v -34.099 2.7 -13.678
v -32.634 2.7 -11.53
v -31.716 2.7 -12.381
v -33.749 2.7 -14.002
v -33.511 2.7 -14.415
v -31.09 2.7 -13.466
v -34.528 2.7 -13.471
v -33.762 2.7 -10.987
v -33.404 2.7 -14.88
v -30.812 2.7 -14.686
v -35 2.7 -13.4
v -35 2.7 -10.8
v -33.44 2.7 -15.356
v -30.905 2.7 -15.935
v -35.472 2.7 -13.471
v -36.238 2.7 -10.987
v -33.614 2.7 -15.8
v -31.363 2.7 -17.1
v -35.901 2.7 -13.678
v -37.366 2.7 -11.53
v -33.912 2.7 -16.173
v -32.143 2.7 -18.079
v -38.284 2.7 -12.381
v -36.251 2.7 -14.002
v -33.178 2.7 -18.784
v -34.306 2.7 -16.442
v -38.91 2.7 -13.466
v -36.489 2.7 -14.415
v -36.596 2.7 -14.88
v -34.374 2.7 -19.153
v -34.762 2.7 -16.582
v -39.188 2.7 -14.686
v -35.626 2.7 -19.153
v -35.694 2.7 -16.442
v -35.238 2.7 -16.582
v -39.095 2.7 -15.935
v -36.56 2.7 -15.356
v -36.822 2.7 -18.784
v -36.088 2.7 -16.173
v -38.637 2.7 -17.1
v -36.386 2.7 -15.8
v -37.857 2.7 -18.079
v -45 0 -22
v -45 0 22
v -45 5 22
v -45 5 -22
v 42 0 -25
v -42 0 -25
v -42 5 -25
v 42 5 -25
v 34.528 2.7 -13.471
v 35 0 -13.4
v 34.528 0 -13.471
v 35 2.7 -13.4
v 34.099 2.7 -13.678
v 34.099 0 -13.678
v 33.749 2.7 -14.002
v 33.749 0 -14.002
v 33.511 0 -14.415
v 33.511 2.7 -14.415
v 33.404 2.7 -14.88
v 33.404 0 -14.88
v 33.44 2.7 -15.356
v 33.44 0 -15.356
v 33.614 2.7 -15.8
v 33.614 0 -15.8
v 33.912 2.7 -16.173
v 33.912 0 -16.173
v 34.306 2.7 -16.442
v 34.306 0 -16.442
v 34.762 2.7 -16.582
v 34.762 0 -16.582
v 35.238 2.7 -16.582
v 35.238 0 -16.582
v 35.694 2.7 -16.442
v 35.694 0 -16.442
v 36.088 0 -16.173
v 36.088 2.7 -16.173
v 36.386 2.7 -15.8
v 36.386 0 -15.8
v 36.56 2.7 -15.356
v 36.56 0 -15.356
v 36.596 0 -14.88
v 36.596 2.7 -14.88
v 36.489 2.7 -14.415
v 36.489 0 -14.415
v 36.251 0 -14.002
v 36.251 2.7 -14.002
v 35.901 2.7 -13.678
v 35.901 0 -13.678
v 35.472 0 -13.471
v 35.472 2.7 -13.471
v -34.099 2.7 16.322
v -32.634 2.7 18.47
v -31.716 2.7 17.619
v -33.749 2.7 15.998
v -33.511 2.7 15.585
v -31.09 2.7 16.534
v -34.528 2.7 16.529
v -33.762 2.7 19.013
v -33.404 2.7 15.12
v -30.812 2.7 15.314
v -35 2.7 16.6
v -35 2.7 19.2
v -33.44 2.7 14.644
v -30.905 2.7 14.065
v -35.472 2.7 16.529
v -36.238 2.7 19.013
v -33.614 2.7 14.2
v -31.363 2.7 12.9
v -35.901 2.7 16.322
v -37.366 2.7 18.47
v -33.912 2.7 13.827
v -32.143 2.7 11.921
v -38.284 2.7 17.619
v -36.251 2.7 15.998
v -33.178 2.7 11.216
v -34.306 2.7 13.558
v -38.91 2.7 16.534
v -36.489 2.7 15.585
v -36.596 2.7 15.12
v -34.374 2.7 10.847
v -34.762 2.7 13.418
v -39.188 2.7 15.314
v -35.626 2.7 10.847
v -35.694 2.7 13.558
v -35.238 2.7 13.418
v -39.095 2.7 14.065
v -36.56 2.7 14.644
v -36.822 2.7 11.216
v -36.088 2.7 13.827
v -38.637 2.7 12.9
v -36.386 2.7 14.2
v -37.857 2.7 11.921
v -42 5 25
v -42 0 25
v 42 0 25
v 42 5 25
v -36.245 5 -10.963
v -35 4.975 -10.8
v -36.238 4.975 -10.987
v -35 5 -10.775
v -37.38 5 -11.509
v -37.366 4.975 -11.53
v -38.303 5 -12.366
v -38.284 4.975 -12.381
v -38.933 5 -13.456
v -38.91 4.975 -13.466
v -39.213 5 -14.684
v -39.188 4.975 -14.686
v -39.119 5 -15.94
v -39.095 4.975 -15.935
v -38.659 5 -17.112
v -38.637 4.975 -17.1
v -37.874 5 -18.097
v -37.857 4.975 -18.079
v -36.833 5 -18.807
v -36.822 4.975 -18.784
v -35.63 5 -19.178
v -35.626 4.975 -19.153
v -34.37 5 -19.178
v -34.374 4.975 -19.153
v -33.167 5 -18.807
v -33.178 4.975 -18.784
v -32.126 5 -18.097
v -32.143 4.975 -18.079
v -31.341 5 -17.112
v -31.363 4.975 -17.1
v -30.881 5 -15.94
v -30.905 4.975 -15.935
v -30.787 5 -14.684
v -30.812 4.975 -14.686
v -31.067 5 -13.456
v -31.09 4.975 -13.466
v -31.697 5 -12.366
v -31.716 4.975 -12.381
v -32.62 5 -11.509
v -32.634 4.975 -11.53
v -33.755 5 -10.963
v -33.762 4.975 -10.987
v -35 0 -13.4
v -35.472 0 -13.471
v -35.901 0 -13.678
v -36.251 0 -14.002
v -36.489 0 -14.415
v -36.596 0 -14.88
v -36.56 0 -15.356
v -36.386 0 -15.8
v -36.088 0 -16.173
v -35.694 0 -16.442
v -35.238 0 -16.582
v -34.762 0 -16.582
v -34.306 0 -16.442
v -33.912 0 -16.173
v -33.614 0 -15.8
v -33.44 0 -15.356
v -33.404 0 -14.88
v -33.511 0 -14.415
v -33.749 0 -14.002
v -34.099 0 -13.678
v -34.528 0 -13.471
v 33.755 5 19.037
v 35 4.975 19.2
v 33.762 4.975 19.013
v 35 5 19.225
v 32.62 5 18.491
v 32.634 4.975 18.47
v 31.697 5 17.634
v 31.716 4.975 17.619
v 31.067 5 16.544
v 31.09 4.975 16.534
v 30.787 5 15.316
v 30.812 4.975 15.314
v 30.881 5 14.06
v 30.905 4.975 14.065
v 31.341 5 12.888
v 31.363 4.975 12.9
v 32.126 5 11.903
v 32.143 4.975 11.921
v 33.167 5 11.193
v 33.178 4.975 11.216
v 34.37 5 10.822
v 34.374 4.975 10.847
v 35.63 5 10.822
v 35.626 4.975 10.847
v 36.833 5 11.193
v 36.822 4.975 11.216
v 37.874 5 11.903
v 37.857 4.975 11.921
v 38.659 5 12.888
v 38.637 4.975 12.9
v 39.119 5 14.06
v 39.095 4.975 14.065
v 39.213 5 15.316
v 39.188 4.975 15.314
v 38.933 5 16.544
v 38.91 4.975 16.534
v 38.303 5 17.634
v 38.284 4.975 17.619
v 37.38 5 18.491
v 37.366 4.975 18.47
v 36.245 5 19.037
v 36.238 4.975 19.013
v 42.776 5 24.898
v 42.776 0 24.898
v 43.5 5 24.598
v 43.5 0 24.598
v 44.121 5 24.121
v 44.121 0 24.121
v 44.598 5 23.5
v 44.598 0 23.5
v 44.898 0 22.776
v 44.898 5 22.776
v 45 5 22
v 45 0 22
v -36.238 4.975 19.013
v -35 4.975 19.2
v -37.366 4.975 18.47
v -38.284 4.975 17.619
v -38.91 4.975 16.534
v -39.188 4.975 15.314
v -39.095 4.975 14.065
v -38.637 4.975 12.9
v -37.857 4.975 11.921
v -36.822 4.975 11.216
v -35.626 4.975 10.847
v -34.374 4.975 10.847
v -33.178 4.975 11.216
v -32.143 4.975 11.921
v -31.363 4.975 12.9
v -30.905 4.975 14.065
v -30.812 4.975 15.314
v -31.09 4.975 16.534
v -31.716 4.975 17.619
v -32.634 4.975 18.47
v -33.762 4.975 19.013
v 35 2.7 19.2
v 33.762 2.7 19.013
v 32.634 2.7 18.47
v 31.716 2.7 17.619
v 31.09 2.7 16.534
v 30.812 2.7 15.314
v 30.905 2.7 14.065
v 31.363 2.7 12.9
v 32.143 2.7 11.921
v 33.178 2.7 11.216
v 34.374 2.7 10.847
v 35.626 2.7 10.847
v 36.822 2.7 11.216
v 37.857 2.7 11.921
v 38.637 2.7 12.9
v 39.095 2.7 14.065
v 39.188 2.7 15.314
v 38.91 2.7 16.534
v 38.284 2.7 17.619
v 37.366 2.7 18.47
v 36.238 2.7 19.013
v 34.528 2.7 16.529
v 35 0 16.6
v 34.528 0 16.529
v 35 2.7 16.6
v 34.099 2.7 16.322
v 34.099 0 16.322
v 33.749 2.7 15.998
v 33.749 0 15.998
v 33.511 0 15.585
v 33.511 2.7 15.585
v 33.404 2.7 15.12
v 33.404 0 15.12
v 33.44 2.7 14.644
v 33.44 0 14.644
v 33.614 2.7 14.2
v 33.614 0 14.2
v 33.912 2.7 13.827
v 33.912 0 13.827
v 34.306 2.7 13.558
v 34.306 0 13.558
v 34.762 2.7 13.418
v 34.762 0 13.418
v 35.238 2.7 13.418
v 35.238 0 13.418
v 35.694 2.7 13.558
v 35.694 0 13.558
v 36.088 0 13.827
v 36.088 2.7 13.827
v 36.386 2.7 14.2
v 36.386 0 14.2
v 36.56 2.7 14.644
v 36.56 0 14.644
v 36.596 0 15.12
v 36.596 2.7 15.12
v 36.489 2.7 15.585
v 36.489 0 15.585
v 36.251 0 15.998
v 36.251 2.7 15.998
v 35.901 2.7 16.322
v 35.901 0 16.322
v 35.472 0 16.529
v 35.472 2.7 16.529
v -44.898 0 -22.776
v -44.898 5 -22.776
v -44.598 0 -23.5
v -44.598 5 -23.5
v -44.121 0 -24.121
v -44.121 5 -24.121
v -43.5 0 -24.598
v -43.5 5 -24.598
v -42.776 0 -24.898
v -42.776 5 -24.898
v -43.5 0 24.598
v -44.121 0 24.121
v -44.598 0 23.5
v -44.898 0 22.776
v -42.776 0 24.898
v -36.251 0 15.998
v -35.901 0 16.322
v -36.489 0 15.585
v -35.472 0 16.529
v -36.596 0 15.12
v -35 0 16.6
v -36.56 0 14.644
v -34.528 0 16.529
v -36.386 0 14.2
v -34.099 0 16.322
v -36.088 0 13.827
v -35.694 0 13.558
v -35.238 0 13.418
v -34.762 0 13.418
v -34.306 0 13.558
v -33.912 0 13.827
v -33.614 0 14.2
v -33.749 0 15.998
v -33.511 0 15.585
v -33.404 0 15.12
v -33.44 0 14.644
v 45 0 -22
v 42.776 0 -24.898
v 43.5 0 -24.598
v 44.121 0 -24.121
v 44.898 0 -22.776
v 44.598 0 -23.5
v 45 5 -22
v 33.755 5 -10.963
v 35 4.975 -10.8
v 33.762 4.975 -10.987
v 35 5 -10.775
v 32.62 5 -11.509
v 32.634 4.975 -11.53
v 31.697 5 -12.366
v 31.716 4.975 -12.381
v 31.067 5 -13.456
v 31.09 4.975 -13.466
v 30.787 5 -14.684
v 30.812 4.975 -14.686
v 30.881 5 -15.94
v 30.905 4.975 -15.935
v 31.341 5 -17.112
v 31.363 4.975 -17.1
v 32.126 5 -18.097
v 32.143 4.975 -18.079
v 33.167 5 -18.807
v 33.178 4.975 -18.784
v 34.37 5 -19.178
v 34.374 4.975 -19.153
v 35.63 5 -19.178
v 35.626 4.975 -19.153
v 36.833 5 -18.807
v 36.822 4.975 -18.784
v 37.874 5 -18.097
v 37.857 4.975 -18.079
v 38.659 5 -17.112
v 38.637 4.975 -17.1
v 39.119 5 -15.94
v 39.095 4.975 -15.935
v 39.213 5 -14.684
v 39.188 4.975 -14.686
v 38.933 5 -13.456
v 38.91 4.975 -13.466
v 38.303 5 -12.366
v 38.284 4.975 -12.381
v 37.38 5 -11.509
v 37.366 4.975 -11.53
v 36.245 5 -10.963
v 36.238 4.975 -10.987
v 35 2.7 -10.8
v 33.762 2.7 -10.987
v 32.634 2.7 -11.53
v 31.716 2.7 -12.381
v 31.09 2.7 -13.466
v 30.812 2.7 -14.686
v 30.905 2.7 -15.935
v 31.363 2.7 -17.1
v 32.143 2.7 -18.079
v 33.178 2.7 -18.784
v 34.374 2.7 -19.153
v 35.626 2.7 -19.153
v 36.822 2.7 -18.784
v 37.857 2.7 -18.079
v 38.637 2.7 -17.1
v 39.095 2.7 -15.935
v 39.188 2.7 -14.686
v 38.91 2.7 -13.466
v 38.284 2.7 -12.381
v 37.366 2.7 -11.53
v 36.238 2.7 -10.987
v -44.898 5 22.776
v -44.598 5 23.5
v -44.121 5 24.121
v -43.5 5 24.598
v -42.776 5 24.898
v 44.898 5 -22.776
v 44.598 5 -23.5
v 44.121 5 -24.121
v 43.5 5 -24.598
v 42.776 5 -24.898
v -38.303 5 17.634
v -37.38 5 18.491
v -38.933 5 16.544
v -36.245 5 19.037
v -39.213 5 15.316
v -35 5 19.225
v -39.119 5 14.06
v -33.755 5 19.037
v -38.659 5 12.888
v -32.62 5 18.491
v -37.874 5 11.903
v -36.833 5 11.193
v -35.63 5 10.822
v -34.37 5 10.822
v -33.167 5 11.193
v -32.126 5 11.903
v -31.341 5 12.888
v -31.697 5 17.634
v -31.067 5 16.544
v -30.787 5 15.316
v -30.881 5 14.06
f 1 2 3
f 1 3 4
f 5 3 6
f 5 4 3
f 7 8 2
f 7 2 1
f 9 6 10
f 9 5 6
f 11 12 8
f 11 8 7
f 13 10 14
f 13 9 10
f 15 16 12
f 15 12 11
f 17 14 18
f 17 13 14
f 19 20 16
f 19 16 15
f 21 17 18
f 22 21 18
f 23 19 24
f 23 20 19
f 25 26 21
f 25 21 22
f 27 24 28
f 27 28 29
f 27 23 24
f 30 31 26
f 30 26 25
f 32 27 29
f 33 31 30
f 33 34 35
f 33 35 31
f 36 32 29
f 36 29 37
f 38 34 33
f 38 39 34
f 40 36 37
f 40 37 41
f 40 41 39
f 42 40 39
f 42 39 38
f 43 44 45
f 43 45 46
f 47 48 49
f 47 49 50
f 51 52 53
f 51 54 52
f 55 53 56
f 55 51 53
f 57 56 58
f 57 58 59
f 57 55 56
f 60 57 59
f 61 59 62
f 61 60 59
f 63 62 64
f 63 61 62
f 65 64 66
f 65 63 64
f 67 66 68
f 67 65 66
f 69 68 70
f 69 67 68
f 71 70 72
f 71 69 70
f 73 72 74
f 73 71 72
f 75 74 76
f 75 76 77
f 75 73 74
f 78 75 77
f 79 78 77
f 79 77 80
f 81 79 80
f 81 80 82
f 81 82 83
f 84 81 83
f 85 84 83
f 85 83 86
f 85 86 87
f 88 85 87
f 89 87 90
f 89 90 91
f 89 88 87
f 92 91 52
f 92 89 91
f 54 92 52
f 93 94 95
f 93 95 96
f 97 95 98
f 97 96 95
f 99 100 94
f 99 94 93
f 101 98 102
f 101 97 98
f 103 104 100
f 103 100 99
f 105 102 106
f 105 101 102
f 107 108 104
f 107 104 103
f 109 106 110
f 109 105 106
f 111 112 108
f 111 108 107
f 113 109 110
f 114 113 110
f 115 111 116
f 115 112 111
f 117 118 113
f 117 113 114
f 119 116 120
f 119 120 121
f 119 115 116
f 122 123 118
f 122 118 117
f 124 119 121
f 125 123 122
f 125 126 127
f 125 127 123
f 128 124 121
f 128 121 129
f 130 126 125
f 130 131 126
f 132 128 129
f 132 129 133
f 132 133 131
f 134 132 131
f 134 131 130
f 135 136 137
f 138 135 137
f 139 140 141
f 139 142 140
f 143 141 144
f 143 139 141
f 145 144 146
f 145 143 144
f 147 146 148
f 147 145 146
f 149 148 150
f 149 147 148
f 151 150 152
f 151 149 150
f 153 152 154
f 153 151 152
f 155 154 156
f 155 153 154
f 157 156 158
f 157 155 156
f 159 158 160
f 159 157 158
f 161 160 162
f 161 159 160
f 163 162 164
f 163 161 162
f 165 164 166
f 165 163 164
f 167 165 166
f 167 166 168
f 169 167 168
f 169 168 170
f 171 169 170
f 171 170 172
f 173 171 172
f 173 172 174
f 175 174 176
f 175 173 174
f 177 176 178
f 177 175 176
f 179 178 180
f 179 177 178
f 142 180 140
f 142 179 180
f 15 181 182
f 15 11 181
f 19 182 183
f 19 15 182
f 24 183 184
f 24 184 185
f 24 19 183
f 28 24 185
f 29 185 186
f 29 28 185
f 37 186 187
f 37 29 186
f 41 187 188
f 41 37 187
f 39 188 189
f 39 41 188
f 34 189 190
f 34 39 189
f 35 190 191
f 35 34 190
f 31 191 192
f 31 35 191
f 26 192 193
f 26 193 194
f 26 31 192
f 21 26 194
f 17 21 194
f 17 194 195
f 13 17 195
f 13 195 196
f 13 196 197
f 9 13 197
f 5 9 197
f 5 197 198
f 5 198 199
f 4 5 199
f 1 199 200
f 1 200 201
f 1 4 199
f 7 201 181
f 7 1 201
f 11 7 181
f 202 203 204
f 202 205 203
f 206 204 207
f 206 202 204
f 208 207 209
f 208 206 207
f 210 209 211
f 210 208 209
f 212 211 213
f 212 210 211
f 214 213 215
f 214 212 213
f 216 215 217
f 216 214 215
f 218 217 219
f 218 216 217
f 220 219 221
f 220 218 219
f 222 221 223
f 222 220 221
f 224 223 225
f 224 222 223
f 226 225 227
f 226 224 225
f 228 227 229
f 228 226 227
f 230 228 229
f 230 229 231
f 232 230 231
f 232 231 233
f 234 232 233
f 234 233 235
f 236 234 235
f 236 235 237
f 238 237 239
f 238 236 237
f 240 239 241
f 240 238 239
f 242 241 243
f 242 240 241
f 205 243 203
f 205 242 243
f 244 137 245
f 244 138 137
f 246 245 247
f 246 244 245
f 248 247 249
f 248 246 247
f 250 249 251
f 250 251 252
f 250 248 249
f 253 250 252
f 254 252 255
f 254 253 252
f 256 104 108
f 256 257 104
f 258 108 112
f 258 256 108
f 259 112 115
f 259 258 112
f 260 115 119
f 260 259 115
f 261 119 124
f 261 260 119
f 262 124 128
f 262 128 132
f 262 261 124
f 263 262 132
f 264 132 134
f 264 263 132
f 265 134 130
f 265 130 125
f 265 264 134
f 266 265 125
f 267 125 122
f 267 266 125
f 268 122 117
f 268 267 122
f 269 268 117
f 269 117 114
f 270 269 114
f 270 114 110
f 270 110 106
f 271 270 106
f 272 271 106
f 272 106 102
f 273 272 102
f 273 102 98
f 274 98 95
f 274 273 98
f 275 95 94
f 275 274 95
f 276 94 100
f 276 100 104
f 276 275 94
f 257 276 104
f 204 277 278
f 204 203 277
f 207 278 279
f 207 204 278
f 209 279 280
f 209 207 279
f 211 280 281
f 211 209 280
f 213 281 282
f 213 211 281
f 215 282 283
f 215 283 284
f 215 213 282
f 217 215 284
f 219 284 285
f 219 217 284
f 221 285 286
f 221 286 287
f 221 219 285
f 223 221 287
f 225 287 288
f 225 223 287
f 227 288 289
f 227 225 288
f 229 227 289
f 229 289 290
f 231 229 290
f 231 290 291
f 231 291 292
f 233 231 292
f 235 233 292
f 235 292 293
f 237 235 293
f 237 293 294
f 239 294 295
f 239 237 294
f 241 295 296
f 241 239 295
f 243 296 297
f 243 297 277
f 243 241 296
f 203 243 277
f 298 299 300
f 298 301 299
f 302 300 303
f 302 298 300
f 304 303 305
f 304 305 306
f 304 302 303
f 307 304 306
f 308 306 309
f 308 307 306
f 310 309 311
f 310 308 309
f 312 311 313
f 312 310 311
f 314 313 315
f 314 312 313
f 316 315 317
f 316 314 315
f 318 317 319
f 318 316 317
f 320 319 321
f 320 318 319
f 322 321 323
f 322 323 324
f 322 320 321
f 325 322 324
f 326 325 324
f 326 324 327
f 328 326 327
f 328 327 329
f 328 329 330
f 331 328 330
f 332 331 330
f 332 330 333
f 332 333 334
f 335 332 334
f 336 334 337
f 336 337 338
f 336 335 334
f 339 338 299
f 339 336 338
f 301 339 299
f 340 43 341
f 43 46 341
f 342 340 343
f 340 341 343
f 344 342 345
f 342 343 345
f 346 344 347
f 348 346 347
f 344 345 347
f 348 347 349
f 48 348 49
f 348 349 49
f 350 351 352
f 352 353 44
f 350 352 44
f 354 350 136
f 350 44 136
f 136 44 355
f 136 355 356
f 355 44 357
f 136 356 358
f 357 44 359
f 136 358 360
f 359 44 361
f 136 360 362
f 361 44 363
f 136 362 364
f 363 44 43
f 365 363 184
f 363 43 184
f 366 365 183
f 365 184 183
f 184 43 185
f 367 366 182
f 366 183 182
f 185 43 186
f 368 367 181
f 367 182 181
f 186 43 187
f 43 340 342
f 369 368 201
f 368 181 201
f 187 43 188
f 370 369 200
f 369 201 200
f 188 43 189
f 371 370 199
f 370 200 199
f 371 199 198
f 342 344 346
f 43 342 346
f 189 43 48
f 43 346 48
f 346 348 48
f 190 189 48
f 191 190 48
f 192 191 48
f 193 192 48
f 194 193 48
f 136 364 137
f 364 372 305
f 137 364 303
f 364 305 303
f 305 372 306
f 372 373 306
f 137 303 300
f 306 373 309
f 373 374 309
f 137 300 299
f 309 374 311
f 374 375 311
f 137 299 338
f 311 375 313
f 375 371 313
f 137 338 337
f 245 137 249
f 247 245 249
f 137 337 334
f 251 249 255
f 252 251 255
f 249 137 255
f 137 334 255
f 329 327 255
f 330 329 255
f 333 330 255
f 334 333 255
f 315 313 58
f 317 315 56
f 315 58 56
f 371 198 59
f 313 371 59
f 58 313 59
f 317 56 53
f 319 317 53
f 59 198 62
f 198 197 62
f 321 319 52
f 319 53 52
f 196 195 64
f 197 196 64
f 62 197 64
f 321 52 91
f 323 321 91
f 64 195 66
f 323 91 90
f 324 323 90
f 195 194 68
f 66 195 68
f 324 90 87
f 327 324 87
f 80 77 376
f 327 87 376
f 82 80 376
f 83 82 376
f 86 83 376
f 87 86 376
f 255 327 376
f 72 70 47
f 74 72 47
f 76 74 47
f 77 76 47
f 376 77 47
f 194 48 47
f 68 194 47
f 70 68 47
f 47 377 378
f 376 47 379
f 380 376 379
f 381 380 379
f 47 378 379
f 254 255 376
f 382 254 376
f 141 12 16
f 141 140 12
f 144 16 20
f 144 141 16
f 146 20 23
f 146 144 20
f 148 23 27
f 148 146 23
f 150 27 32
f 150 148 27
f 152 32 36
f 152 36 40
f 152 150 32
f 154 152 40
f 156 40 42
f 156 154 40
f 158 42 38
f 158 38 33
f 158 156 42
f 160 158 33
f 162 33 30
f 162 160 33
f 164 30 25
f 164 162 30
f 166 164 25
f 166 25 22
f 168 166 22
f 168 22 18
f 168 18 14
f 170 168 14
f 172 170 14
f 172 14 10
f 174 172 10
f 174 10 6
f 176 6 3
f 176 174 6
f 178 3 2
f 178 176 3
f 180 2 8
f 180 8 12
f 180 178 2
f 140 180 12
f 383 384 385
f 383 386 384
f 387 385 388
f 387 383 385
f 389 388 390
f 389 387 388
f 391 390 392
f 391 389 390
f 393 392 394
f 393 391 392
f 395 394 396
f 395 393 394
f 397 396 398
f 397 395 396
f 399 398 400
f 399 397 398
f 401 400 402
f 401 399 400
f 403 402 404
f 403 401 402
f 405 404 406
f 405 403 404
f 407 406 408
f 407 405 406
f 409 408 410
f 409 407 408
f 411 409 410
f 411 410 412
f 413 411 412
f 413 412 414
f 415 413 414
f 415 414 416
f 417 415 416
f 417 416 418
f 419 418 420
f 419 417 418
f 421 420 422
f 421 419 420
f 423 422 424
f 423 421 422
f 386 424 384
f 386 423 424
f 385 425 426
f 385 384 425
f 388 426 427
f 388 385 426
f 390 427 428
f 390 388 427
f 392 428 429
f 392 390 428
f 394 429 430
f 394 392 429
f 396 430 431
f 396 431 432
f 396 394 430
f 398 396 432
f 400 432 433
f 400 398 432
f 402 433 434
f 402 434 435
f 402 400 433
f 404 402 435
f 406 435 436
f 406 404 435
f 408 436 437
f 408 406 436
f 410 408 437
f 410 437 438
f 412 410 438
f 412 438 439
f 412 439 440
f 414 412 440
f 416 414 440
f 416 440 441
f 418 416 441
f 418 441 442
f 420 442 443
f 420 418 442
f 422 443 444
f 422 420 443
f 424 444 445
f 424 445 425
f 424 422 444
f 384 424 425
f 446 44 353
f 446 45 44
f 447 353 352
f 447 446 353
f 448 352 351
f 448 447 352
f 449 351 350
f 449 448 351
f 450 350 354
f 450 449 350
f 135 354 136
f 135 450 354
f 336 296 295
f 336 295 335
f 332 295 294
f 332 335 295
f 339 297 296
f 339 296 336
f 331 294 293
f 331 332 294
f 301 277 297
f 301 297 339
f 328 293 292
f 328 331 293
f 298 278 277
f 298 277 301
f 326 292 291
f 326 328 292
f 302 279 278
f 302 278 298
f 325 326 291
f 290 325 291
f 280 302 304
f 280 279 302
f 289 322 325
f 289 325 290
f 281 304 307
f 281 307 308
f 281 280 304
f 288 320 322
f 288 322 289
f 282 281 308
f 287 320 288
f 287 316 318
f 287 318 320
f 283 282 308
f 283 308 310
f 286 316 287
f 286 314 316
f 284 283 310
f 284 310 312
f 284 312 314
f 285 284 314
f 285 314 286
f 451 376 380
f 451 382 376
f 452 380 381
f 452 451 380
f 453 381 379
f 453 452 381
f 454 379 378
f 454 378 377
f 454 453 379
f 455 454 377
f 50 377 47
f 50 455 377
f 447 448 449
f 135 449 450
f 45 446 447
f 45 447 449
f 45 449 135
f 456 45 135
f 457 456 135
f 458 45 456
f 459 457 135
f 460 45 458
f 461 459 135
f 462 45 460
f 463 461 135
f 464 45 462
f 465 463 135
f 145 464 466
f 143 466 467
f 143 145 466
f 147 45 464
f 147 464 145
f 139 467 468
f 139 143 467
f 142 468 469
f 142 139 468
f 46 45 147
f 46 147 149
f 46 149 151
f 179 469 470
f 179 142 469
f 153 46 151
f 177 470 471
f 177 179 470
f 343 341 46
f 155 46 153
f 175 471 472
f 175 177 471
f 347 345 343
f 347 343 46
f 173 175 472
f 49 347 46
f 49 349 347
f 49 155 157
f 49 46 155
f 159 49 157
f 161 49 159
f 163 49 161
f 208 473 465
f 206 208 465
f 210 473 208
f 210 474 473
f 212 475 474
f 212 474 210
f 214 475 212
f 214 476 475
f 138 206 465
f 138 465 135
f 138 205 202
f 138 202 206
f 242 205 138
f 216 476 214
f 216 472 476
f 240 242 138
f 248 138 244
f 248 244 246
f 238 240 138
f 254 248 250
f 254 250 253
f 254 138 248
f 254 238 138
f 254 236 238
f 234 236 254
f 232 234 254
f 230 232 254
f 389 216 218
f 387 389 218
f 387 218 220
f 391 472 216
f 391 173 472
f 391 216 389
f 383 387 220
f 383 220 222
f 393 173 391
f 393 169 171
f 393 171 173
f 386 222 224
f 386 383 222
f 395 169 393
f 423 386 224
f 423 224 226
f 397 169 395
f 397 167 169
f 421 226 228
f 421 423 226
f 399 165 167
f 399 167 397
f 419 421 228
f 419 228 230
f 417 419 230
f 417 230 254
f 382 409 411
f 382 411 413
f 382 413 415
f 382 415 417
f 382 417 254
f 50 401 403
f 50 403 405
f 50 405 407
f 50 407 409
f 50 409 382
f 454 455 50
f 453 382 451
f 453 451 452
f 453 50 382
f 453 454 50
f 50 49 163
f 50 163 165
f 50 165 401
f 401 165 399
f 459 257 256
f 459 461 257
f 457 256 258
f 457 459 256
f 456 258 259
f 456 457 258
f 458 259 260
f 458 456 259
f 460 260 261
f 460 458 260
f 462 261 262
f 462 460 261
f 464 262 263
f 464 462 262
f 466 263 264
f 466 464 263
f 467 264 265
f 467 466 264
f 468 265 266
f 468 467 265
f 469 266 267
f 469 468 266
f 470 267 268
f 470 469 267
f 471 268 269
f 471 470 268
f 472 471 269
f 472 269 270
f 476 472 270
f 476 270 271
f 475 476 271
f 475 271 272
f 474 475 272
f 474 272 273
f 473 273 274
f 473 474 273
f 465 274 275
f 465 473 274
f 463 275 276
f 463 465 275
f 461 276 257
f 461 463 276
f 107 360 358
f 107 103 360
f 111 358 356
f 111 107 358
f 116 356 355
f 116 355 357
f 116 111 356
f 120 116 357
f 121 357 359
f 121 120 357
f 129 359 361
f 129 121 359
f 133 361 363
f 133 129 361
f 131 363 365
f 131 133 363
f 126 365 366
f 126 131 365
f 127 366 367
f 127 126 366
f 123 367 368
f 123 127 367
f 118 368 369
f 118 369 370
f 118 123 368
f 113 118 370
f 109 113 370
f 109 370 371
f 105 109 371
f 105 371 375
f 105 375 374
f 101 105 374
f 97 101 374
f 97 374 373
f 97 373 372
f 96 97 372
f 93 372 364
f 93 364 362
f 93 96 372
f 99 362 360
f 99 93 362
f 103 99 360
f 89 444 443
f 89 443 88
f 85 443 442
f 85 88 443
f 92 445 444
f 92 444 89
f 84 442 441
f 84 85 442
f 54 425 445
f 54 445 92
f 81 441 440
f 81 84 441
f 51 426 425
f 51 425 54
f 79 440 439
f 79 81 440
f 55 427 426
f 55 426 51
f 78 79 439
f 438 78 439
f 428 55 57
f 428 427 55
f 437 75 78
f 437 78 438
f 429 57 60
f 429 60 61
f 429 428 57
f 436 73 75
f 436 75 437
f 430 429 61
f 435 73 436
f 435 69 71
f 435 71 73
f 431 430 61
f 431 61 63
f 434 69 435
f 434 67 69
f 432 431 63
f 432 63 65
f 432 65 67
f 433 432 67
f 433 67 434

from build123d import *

# Parameters (mm, degrees)
SKETCH1_W                                     = 90
SKETCH1_H                                     = 50
BOSS_EXTRUDE2_DEPTH                           = 5
FILLET1_R                                     = 3
CBORE_FOR_M3_HEX_HEAD_MACHINE_SCREW1_AT_COUNT = 2
CBORE_FOR_M3_HEX_HEAD_MACHINE_SCREW1_AT_PITCH = 30
CBORE_FOR_M3_HEX_HEAD_MACHINE_SCREW1_2_COUNT  = 2
CBORE_FOR_M3_HEX_HEAD_MACHINE_SCREW1_2_PITCH  = 76.157731059
CBORE_FOR_M3_HEX_HEAD_MACHINE_SCREW1_3_COUNT  = 2
CBORE_FOR_M3_HEX_HEAD_MACHINE_SCREW1_3_PITCH  = 70


with BuildPart() as part:
    # Sketch1 → Boss-Extrude2 (new body)
    with BuildSketch(Plane(origin=(0, 0, 0), x_dir=(1, 0, 0), z_dir=(0, 1, 0))):
        Rectangle(SKETCH1_W, SKETCH1_H)
    extrude(amount=BOSS_EXTRUDE2_DEPTH)

    # Fillet1
    fillet1_edges = [part.edges().sort_by_distance(p)[0] for p in [
        (-45, 2.5, -25),
        (45, 2.5, -25),
        (45, 2.5, 25),
        (-45, 2.5, 25),
    ]]
    fillet(fillet1_edges, radius=FILLET1_R)

    # Sketch6 → CBORE for M3 Hex Head Machine Screw1 (revolve, cut)
    with BuildSketch(Plane(origin=(-35, 5, -15), x_dir=(0, 0, 1), z_dir=(1, 0, 0))):
        Polygon((0, 0), (0, 5.96137699), (1.6, 5), (1.6, 2.3), (4.2, 2.3), (4.2, 0.025), (4.225, 0), align=None)
    cbore_for_m3_hex_head_machine_screw1 = revolve(axis=Axis((-35, 11.35, -15), (0, -1, 0)), mode=Mode.SUBTRACT)

    # CBORE for M3 Hex Head Machine Screw1 at: CBORE for M3 Hex Head Machine Screw1 ×2
    with Locations(*[(0, 0, i * CBORE_FOR_M3_HEX_HEAD_MACHINE_SCREW1_AT_PITCH) for i in range(1, CBORE_FOR_M3_HEX_HEAD_MACHINE_SCREW1_AT_COUNT)]):
        add(cbore_for_m3_hex_head_machine_screw1, mode=Mode.SUBTRACT)

    # CBORE for M3 Hex Head Machine Screw1 2: CBORE for M3 Hex Head Machine Screw1 ×2
    with Locations(*[Vector(0.9191450300180579, 0, 0.3939192985791677) * (i * CBORE_FOR_M3_HEX_HEAD_MACHINE_SCREW1_2_PITCH) for i in range(1, CBORE_FOR_M3_HEX_HEAD_MACHINE_SCREW1_2_COUNT)]):
        add(cbore_for_m3_hex_head_machine_screw1, mode=Mode.SUBTRACT)

    # CBORE for M3 Hex Head Machine Screw1 3: CBORE for M3 Hex Head Machine Screw1 ×2
    with Locations(*[(i * CBORE_FOR_M3_HEX_HEAD_MACHINE_SCREW1_3_PITCH, 0, 0) for i in range(1, CBORE_FOR_M3_HEX_HEAD_MACHINE_SCREW1_3_COUNT)]):
        add(cbore_for_m3_hex_head_machine_screw1, mode=Mode.SUBTRACT)


solid = part.part
